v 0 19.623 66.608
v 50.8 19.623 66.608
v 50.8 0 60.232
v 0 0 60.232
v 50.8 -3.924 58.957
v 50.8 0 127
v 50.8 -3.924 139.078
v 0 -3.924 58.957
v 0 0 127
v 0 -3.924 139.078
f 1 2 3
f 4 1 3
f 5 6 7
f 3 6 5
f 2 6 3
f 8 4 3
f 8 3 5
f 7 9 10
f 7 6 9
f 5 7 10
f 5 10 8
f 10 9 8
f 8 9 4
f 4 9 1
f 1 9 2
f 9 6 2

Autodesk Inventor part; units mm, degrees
ref_plane "YZ Plane" through (0, 0, 0) normal (1, 0, 0) x (0, 1, 0)
ref_plane "XZ Plane" through (0, 0, 0) normal (0, 1, 0) x (-1, 0, 0)
ref_plane "XY Plane" through (0, 0, 0) normal (0, 0, 1) x (1, 0, 0)
sketch "Sketch1" plane through (0, 0, 0) normal (0, 0, 1) x (1, 0, 0)
  line L0 (0, 0) -> (50.8, 0)
  line L1 (50.8, 0) -> (50.8, 50.8)
  line L2 (50.8, 50.8) -> (0, 50.8)
  line L3 (0, 50.8) -> (0, 0)
  dimension "d0" = 50.8
  dimension "d1" = 50.8
extrude "Extrusion1" add sketch "Sketch1" along normal blind 127
sketch "Sketch2" plane through (50.8, 0, 0) normal (1, 0, 0) x (0, 0, -1)
  line L0 (-127, 50.8) -> (-127, 0) projected
  line L1 (0, 0) -> (-127, 0) projected
  line L2 (0, 0) -> (0, 50.8) projected
  line L3 (0, 50.8) -> (-127, 50.8) projected
  line L4 (-127, 0) -> (-66.6079, 19.6226)
  line L5 (-127, 0) -> (-63.5, 0) construction
  line L6 (-66.6079, 19.6226) -> (-60.2321, 0)
  line L7 (-60.2321, 0) -> (-127, 0)
  dimension "d4" = 63.5
  dimension "d5" = 18
extrude "Extrusion2" cut sketch "Sketch2" against normal blind 127 contours L3 L2 L1 L6 L4 L0
sketch "Sketch3" plane through (50.8, 0, 127) normal (1, 0, 0) x (0, 0, -1)
  line L0 (66.7679, 0) -> (60.3921, 19.6226) projected
  line L1 (60.3921, 19.6226) -> (0, 0) projected
  line L2 (66.7679, 0) -> (0, 0) projected
  line L3 (60.3921, 19.6226) -> (-12.0784, -3.9245)
  line L4 (-12.0784, -3.9245) -> (70.1883, -3.9245)
  line L5 (60.3921, 19.6226) -> (68.043, -3.9245)
  point P0 (127, 0)
  dimension "d8" = 76.2
extrude "Extrusion3" add sketch "Sketch3" against normal blind 50.8 contours L5 L4 L3 L2
properties part number "Goal Guide 2"
